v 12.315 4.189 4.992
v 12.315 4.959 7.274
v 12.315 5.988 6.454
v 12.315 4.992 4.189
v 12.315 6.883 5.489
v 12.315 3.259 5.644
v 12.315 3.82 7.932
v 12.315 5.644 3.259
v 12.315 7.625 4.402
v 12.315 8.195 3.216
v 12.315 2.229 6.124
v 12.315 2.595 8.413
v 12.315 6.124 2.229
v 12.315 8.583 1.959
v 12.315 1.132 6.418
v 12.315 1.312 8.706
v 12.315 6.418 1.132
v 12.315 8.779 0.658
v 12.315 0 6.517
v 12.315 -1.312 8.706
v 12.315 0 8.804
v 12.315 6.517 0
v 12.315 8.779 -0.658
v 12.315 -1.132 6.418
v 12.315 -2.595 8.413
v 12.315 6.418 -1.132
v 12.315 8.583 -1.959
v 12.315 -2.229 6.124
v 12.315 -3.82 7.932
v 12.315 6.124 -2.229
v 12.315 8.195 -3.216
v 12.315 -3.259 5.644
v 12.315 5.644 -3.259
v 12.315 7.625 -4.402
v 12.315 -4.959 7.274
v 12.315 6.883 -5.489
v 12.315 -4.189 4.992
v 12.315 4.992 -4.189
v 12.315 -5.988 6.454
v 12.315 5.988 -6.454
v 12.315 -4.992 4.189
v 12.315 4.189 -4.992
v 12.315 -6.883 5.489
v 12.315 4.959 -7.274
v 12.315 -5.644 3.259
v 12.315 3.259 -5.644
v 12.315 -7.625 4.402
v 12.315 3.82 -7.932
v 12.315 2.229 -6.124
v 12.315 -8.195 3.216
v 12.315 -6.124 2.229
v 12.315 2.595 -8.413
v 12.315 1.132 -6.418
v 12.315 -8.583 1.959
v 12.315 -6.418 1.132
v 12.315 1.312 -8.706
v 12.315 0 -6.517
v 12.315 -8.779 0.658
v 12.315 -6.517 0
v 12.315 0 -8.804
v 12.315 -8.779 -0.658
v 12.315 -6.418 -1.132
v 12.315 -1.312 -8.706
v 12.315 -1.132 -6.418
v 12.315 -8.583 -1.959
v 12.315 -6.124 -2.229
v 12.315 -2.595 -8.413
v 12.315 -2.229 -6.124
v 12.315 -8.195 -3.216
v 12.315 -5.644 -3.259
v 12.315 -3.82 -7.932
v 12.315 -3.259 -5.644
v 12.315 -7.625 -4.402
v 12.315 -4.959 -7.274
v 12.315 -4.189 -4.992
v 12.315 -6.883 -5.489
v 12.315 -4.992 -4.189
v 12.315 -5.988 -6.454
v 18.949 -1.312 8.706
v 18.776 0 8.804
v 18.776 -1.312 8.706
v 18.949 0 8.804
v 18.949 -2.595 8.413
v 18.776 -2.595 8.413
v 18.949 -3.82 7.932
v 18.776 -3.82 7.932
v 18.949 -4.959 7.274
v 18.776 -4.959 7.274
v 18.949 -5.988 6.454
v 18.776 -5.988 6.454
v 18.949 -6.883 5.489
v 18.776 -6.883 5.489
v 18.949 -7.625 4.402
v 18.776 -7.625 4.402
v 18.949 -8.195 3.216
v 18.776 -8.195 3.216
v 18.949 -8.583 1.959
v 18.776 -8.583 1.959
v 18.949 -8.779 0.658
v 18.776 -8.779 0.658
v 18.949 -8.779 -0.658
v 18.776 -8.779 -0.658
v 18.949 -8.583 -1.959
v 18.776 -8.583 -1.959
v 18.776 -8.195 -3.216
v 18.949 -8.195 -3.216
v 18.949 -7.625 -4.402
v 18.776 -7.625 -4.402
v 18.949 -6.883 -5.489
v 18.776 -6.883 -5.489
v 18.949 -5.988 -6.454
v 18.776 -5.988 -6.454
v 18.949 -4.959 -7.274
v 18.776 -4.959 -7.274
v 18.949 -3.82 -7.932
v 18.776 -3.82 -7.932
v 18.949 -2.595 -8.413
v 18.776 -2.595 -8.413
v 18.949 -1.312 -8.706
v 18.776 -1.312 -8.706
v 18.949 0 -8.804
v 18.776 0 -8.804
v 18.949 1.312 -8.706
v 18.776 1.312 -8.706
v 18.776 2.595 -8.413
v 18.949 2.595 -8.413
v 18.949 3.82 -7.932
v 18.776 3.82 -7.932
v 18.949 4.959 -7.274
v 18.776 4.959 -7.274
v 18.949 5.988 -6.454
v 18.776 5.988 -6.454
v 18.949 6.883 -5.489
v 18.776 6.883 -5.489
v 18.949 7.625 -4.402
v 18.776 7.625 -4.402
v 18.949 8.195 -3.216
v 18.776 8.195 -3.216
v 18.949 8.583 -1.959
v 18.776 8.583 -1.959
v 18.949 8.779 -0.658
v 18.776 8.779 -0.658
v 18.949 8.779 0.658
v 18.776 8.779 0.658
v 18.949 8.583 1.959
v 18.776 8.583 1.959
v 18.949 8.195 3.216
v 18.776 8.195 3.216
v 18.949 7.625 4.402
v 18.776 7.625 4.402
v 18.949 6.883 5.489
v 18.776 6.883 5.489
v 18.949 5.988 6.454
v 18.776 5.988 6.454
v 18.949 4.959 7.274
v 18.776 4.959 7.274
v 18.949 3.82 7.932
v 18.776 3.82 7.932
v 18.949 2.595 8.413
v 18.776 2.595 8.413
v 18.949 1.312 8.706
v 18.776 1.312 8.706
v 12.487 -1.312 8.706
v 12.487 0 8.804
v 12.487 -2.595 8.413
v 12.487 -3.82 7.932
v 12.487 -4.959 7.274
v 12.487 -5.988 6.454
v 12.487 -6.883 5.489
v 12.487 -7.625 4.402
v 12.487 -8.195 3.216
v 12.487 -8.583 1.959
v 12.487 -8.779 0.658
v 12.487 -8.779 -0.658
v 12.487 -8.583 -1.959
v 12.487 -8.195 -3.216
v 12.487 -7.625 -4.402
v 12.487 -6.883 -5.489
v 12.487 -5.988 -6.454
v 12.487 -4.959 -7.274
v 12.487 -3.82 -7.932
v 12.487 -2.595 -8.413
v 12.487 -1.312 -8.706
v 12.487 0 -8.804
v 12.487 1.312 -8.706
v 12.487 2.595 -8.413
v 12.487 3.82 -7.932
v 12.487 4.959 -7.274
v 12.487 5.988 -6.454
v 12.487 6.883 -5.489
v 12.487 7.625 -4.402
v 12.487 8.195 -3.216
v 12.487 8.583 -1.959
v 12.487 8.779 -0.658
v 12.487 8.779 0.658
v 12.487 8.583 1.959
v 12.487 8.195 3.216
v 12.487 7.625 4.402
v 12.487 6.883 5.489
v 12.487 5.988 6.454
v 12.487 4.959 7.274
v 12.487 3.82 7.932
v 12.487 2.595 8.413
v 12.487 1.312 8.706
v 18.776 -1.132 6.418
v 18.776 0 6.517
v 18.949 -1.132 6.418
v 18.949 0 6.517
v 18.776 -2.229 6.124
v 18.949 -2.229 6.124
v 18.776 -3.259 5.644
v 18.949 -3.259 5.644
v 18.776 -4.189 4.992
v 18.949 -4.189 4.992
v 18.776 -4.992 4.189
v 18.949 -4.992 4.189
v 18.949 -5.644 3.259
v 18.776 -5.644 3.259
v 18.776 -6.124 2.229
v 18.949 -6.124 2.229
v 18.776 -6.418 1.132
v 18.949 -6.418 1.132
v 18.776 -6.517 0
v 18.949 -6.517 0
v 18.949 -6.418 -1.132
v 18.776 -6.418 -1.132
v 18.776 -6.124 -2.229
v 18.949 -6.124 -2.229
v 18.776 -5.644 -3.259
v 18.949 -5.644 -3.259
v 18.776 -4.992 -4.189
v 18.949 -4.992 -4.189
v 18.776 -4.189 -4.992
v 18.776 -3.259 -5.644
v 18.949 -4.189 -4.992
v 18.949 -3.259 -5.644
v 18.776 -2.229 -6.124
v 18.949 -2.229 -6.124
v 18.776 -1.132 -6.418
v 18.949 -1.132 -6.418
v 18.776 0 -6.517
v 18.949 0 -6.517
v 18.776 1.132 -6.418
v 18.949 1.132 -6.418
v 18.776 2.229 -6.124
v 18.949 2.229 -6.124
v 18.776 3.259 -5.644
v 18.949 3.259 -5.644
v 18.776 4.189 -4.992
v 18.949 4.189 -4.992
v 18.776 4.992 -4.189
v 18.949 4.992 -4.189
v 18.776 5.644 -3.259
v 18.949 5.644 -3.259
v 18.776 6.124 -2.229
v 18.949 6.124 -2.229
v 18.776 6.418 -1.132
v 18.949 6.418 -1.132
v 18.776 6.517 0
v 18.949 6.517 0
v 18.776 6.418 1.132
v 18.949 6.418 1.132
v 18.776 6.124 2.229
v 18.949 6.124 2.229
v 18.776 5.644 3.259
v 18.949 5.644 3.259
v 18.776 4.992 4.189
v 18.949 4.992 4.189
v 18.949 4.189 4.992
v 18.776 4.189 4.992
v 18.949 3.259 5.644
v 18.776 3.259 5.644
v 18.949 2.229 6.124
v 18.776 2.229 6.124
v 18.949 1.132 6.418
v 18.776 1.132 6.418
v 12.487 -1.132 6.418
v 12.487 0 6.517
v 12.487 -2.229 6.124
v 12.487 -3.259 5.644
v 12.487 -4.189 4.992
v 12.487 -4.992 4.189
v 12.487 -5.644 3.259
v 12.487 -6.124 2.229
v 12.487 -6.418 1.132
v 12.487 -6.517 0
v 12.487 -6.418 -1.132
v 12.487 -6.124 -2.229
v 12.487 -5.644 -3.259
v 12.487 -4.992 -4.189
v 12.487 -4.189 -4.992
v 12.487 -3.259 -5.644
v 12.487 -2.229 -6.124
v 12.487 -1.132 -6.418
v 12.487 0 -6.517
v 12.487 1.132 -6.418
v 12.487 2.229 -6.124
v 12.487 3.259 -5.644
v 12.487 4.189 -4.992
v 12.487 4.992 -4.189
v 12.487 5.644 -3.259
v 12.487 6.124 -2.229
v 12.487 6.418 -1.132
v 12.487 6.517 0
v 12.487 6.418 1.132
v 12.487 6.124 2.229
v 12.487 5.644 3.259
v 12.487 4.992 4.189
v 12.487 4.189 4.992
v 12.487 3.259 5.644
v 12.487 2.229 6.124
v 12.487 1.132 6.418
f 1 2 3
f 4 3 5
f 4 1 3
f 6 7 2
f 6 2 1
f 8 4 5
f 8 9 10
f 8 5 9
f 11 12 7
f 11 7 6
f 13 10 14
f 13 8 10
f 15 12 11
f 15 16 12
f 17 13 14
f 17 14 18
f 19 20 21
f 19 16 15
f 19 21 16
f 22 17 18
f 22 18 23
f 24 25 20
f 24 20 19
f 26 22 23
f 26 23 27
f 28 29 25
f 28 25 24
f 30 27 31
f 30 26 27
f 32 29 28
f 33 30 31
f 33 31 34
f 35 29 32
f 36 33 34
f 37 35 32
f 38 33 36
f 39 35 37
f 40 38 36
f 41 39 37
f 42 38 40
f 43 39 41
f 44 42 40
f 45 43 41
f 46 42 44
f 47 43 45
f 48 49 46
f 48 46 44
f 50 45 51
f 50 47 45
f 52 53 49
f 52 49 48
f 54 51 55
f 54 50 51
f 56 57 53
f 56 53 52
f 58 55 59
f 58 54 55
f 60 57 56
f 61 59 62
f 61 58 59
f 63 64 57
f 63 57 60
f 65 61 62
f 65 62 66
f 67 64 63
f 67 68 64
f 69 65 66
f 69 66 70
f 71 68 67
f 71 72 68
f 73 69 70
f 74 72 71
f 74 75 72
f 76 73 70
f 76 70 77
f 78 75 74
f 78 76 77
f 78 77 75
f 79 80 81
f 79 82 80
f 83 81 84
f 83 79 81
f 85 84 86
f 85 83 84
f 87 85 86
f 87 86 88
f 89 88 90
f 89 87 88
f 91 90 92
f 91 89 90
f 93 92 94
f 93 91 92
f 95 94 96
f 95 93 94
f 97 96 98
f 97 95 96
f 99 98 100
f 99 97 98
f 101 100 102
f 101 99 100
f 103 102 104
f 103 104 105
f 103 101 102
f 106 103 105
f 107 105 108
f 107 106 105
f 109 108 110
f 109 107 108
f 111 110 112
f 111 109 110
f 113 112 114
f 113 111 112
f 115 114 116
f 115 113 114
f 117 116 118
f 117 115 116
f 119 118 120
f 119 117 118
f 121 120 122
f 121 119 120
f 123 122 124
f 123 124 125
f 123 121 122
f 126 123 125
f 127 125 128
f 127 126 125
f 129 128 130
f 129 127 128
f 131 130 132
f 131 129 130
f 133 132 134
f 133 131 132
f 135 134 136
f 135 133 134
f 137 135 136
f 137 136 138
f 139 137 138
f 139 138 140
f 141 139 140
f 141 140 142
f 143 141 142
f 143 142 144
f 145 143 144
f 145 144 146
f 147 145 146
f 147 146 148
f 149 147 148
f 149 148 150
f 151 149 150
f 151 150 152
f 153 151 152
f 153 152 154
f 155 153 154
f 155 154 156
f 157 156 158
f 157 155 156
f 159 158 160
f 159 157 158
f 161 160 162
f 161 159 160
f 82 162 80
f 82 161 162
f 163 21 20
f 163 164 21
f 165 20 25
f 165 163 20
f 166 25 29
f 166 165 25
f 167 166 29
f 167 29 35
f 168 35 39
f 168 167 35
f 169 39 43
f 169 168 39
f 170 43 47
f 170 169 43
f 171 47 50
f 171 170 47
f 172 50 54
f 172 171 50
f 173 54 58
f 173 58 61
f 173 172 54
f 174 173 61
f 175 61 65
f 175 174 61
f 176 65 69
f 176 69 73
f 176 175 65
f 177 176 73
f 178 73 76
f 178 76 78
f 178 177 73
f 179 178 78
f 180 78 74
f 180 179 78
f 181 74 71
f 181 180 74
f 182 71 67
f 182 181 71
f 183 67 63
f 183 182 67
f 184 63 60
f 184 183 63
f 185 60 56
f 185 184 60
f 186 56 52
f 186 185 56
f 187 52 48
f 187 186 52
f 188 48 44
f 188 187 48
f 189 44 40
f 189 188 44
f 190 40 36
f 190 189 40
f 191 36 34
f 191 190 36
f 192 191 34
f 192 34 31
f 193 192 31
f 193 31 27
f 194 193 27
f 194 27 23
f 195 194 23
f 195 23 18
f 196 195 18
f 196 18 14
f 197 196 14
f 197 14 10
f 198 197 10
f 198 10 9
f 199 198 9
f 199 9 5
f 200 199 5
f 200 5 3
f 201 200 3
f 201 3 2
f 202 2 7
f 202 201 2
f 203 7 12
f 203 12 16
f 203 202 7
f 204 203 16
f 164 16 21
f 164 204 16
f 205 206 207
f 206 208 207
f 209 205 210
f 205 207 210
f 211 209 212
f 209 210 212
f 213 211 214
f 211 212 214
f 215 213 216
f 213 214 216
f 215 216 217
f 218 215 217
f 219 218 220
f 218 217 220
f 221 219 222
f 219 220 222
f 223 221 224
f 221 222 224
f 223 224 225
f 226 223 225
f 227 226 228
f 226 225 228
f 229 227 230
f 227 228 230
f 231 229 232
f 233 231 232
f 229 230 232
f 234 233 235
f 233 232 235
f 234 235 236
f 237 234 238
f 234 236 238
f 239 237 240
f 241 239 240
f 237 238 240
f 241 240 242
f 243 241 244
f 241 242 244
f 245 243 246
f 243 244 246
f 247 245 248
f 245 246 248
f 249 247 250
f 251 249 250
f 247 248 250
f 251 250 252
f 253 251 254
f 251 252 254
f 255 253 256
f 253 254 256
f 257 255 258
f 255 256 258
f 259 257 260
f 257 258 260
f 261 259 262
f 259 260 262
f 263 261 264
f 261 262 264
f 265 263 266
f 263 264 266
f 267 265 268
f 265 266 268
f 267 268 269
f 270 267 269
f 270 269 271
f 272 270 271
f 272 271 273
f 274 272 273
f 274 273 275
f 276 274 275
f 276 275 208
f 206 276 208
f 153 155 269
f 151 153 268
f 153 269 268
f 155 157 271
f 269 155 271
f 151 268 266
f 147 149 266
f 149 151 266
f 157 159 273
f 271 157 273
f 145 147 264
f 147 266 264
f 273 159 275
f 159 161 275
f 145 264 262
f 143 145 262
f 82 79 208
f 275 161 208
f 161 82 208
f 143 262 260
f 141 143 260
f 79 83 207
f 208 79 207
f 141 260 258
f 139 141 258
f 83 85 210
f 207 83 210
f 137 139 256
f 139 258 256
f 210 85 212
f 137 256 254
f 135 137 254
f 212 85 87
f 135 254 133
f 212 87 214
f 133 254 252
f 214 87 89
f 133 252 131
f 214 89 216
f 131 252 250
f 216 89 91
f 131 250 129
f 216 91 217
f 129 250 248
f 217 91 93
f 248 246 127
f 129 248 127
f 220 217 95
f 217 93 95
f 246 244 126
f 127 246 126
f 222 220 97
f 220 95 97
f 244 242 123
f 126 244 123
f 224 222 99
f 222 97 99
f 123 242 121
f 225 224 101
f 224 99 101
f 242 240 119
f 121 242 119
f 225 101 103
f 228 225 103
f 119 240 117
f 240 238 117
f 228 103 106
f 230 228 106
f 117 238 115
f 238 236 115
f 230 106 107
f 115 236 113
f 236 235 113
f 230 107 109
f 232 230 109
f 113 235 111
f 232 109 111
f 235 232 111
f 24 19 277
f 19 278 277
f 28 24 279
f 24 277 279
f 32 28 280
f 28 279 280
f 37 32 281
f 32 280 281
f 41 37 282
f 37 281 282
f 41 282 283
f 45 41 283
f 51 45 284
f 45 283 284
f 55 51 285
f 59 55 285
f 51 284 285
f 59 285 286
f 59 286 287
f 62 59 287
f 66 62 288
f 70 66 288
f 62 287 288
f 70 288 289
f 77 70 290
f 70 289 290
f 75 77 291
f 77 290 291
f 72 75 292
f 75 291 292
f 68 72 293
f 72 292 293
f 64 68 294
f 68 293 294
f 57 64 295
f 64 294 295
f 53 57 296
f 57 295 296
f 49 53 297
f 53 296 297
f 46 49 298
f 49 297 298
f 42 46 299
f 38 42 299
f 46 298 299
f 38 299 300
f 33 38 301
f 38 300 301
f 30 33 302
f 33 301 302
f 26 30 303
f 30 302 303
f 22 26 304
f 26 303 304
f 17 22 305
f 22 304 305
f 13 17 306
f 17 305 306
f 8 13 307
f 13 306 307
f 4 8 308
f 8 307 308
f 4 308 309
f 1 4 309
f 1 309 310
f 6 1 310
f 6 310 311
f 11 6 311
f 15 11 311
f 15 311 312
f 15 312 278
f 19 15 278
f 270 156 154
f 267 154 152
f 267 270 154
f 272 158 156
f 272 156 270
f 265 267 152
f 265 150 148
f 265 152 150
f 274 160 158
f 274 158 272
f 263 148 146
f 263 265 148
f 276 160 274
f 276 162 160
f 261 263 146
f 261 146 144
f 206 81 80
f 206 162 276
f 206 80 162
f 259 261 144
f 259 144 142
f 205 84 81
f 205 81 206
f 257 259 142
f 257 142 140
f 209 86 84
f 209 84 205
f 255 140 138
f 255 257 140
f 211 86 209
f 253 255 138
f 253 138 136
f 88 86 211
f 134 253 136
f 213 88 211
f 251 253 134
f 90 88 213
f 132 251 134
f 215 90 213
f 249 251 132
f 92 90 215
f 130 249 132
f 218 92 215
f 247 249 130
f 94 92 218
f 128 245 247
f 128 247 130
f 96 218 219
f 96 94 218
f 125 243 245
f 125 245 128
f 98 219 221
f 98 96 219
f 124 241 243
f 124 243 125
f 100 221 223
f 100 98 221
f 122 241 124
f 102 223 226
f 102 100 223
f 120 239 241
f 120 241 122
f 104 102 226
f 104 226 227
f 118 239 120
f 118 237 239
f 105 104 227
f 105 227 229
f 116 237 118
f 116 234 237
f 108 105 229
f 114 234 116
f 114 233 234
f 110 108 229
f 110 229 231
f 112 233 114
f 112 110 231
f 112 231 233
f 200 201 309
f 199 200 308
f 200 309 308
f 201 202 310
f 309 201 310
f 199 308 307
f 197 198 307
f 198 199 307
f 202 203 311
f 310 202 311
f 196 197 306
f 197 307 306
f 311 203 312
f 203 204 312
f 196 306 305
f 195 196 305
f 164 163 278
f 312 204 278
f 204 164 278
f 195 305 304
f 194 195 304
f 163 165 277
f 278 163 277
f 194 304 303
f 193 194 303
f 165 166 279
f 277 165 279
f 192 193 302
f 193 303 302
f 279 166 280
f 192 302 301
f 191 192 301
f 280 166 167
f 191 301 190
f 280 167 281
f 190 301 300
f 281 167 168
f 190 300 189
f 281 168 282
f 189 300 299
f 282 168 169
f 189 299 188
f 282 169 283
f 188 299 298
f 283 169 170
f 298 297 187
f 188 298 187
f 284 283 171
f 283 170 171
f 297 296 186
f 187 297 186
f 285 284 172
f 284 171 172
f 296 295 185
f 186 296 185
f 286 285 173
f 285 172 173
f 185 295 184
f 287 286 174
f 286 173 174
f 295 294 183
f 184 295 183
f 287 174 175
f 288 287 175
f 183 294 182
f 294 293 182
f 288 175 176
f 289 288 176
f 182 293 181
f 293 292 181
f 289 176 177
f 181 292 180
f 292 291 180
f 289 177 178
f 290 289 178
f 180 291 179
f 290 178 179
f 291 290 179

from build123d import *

# Parameters (mm, degrees)
ESQUISSE1_W   = 0.172797848
ESQUISSE1_H   = 2.286894477
ESQUISSE1_W_2 = 0.172797849


with BuildPart() as part:
    # Esquisse1 → Révolution1 (revolve)
    with BuildSketch(Plane.XY, mode=Mode.PRIVATE) as r_volution1_sk:
        with Locations((12.401086859, 7.66059267)):
            Rectangle(ESQUISSE1_W, ESQUISSE1_H)
        with Locations((18.862762915, 7.66059267)):
            Rectangle(ESQUISSE1_W_2, ESQUISSE1_H)
    revolve(r_volution1_sk.sketch.rotate(Axis((10.74557461, 0, 0), (1, 0, 0)), 90), axis=Axis((10.74557461, 0, 0), (1, 0, 0)))


solid = part.part
